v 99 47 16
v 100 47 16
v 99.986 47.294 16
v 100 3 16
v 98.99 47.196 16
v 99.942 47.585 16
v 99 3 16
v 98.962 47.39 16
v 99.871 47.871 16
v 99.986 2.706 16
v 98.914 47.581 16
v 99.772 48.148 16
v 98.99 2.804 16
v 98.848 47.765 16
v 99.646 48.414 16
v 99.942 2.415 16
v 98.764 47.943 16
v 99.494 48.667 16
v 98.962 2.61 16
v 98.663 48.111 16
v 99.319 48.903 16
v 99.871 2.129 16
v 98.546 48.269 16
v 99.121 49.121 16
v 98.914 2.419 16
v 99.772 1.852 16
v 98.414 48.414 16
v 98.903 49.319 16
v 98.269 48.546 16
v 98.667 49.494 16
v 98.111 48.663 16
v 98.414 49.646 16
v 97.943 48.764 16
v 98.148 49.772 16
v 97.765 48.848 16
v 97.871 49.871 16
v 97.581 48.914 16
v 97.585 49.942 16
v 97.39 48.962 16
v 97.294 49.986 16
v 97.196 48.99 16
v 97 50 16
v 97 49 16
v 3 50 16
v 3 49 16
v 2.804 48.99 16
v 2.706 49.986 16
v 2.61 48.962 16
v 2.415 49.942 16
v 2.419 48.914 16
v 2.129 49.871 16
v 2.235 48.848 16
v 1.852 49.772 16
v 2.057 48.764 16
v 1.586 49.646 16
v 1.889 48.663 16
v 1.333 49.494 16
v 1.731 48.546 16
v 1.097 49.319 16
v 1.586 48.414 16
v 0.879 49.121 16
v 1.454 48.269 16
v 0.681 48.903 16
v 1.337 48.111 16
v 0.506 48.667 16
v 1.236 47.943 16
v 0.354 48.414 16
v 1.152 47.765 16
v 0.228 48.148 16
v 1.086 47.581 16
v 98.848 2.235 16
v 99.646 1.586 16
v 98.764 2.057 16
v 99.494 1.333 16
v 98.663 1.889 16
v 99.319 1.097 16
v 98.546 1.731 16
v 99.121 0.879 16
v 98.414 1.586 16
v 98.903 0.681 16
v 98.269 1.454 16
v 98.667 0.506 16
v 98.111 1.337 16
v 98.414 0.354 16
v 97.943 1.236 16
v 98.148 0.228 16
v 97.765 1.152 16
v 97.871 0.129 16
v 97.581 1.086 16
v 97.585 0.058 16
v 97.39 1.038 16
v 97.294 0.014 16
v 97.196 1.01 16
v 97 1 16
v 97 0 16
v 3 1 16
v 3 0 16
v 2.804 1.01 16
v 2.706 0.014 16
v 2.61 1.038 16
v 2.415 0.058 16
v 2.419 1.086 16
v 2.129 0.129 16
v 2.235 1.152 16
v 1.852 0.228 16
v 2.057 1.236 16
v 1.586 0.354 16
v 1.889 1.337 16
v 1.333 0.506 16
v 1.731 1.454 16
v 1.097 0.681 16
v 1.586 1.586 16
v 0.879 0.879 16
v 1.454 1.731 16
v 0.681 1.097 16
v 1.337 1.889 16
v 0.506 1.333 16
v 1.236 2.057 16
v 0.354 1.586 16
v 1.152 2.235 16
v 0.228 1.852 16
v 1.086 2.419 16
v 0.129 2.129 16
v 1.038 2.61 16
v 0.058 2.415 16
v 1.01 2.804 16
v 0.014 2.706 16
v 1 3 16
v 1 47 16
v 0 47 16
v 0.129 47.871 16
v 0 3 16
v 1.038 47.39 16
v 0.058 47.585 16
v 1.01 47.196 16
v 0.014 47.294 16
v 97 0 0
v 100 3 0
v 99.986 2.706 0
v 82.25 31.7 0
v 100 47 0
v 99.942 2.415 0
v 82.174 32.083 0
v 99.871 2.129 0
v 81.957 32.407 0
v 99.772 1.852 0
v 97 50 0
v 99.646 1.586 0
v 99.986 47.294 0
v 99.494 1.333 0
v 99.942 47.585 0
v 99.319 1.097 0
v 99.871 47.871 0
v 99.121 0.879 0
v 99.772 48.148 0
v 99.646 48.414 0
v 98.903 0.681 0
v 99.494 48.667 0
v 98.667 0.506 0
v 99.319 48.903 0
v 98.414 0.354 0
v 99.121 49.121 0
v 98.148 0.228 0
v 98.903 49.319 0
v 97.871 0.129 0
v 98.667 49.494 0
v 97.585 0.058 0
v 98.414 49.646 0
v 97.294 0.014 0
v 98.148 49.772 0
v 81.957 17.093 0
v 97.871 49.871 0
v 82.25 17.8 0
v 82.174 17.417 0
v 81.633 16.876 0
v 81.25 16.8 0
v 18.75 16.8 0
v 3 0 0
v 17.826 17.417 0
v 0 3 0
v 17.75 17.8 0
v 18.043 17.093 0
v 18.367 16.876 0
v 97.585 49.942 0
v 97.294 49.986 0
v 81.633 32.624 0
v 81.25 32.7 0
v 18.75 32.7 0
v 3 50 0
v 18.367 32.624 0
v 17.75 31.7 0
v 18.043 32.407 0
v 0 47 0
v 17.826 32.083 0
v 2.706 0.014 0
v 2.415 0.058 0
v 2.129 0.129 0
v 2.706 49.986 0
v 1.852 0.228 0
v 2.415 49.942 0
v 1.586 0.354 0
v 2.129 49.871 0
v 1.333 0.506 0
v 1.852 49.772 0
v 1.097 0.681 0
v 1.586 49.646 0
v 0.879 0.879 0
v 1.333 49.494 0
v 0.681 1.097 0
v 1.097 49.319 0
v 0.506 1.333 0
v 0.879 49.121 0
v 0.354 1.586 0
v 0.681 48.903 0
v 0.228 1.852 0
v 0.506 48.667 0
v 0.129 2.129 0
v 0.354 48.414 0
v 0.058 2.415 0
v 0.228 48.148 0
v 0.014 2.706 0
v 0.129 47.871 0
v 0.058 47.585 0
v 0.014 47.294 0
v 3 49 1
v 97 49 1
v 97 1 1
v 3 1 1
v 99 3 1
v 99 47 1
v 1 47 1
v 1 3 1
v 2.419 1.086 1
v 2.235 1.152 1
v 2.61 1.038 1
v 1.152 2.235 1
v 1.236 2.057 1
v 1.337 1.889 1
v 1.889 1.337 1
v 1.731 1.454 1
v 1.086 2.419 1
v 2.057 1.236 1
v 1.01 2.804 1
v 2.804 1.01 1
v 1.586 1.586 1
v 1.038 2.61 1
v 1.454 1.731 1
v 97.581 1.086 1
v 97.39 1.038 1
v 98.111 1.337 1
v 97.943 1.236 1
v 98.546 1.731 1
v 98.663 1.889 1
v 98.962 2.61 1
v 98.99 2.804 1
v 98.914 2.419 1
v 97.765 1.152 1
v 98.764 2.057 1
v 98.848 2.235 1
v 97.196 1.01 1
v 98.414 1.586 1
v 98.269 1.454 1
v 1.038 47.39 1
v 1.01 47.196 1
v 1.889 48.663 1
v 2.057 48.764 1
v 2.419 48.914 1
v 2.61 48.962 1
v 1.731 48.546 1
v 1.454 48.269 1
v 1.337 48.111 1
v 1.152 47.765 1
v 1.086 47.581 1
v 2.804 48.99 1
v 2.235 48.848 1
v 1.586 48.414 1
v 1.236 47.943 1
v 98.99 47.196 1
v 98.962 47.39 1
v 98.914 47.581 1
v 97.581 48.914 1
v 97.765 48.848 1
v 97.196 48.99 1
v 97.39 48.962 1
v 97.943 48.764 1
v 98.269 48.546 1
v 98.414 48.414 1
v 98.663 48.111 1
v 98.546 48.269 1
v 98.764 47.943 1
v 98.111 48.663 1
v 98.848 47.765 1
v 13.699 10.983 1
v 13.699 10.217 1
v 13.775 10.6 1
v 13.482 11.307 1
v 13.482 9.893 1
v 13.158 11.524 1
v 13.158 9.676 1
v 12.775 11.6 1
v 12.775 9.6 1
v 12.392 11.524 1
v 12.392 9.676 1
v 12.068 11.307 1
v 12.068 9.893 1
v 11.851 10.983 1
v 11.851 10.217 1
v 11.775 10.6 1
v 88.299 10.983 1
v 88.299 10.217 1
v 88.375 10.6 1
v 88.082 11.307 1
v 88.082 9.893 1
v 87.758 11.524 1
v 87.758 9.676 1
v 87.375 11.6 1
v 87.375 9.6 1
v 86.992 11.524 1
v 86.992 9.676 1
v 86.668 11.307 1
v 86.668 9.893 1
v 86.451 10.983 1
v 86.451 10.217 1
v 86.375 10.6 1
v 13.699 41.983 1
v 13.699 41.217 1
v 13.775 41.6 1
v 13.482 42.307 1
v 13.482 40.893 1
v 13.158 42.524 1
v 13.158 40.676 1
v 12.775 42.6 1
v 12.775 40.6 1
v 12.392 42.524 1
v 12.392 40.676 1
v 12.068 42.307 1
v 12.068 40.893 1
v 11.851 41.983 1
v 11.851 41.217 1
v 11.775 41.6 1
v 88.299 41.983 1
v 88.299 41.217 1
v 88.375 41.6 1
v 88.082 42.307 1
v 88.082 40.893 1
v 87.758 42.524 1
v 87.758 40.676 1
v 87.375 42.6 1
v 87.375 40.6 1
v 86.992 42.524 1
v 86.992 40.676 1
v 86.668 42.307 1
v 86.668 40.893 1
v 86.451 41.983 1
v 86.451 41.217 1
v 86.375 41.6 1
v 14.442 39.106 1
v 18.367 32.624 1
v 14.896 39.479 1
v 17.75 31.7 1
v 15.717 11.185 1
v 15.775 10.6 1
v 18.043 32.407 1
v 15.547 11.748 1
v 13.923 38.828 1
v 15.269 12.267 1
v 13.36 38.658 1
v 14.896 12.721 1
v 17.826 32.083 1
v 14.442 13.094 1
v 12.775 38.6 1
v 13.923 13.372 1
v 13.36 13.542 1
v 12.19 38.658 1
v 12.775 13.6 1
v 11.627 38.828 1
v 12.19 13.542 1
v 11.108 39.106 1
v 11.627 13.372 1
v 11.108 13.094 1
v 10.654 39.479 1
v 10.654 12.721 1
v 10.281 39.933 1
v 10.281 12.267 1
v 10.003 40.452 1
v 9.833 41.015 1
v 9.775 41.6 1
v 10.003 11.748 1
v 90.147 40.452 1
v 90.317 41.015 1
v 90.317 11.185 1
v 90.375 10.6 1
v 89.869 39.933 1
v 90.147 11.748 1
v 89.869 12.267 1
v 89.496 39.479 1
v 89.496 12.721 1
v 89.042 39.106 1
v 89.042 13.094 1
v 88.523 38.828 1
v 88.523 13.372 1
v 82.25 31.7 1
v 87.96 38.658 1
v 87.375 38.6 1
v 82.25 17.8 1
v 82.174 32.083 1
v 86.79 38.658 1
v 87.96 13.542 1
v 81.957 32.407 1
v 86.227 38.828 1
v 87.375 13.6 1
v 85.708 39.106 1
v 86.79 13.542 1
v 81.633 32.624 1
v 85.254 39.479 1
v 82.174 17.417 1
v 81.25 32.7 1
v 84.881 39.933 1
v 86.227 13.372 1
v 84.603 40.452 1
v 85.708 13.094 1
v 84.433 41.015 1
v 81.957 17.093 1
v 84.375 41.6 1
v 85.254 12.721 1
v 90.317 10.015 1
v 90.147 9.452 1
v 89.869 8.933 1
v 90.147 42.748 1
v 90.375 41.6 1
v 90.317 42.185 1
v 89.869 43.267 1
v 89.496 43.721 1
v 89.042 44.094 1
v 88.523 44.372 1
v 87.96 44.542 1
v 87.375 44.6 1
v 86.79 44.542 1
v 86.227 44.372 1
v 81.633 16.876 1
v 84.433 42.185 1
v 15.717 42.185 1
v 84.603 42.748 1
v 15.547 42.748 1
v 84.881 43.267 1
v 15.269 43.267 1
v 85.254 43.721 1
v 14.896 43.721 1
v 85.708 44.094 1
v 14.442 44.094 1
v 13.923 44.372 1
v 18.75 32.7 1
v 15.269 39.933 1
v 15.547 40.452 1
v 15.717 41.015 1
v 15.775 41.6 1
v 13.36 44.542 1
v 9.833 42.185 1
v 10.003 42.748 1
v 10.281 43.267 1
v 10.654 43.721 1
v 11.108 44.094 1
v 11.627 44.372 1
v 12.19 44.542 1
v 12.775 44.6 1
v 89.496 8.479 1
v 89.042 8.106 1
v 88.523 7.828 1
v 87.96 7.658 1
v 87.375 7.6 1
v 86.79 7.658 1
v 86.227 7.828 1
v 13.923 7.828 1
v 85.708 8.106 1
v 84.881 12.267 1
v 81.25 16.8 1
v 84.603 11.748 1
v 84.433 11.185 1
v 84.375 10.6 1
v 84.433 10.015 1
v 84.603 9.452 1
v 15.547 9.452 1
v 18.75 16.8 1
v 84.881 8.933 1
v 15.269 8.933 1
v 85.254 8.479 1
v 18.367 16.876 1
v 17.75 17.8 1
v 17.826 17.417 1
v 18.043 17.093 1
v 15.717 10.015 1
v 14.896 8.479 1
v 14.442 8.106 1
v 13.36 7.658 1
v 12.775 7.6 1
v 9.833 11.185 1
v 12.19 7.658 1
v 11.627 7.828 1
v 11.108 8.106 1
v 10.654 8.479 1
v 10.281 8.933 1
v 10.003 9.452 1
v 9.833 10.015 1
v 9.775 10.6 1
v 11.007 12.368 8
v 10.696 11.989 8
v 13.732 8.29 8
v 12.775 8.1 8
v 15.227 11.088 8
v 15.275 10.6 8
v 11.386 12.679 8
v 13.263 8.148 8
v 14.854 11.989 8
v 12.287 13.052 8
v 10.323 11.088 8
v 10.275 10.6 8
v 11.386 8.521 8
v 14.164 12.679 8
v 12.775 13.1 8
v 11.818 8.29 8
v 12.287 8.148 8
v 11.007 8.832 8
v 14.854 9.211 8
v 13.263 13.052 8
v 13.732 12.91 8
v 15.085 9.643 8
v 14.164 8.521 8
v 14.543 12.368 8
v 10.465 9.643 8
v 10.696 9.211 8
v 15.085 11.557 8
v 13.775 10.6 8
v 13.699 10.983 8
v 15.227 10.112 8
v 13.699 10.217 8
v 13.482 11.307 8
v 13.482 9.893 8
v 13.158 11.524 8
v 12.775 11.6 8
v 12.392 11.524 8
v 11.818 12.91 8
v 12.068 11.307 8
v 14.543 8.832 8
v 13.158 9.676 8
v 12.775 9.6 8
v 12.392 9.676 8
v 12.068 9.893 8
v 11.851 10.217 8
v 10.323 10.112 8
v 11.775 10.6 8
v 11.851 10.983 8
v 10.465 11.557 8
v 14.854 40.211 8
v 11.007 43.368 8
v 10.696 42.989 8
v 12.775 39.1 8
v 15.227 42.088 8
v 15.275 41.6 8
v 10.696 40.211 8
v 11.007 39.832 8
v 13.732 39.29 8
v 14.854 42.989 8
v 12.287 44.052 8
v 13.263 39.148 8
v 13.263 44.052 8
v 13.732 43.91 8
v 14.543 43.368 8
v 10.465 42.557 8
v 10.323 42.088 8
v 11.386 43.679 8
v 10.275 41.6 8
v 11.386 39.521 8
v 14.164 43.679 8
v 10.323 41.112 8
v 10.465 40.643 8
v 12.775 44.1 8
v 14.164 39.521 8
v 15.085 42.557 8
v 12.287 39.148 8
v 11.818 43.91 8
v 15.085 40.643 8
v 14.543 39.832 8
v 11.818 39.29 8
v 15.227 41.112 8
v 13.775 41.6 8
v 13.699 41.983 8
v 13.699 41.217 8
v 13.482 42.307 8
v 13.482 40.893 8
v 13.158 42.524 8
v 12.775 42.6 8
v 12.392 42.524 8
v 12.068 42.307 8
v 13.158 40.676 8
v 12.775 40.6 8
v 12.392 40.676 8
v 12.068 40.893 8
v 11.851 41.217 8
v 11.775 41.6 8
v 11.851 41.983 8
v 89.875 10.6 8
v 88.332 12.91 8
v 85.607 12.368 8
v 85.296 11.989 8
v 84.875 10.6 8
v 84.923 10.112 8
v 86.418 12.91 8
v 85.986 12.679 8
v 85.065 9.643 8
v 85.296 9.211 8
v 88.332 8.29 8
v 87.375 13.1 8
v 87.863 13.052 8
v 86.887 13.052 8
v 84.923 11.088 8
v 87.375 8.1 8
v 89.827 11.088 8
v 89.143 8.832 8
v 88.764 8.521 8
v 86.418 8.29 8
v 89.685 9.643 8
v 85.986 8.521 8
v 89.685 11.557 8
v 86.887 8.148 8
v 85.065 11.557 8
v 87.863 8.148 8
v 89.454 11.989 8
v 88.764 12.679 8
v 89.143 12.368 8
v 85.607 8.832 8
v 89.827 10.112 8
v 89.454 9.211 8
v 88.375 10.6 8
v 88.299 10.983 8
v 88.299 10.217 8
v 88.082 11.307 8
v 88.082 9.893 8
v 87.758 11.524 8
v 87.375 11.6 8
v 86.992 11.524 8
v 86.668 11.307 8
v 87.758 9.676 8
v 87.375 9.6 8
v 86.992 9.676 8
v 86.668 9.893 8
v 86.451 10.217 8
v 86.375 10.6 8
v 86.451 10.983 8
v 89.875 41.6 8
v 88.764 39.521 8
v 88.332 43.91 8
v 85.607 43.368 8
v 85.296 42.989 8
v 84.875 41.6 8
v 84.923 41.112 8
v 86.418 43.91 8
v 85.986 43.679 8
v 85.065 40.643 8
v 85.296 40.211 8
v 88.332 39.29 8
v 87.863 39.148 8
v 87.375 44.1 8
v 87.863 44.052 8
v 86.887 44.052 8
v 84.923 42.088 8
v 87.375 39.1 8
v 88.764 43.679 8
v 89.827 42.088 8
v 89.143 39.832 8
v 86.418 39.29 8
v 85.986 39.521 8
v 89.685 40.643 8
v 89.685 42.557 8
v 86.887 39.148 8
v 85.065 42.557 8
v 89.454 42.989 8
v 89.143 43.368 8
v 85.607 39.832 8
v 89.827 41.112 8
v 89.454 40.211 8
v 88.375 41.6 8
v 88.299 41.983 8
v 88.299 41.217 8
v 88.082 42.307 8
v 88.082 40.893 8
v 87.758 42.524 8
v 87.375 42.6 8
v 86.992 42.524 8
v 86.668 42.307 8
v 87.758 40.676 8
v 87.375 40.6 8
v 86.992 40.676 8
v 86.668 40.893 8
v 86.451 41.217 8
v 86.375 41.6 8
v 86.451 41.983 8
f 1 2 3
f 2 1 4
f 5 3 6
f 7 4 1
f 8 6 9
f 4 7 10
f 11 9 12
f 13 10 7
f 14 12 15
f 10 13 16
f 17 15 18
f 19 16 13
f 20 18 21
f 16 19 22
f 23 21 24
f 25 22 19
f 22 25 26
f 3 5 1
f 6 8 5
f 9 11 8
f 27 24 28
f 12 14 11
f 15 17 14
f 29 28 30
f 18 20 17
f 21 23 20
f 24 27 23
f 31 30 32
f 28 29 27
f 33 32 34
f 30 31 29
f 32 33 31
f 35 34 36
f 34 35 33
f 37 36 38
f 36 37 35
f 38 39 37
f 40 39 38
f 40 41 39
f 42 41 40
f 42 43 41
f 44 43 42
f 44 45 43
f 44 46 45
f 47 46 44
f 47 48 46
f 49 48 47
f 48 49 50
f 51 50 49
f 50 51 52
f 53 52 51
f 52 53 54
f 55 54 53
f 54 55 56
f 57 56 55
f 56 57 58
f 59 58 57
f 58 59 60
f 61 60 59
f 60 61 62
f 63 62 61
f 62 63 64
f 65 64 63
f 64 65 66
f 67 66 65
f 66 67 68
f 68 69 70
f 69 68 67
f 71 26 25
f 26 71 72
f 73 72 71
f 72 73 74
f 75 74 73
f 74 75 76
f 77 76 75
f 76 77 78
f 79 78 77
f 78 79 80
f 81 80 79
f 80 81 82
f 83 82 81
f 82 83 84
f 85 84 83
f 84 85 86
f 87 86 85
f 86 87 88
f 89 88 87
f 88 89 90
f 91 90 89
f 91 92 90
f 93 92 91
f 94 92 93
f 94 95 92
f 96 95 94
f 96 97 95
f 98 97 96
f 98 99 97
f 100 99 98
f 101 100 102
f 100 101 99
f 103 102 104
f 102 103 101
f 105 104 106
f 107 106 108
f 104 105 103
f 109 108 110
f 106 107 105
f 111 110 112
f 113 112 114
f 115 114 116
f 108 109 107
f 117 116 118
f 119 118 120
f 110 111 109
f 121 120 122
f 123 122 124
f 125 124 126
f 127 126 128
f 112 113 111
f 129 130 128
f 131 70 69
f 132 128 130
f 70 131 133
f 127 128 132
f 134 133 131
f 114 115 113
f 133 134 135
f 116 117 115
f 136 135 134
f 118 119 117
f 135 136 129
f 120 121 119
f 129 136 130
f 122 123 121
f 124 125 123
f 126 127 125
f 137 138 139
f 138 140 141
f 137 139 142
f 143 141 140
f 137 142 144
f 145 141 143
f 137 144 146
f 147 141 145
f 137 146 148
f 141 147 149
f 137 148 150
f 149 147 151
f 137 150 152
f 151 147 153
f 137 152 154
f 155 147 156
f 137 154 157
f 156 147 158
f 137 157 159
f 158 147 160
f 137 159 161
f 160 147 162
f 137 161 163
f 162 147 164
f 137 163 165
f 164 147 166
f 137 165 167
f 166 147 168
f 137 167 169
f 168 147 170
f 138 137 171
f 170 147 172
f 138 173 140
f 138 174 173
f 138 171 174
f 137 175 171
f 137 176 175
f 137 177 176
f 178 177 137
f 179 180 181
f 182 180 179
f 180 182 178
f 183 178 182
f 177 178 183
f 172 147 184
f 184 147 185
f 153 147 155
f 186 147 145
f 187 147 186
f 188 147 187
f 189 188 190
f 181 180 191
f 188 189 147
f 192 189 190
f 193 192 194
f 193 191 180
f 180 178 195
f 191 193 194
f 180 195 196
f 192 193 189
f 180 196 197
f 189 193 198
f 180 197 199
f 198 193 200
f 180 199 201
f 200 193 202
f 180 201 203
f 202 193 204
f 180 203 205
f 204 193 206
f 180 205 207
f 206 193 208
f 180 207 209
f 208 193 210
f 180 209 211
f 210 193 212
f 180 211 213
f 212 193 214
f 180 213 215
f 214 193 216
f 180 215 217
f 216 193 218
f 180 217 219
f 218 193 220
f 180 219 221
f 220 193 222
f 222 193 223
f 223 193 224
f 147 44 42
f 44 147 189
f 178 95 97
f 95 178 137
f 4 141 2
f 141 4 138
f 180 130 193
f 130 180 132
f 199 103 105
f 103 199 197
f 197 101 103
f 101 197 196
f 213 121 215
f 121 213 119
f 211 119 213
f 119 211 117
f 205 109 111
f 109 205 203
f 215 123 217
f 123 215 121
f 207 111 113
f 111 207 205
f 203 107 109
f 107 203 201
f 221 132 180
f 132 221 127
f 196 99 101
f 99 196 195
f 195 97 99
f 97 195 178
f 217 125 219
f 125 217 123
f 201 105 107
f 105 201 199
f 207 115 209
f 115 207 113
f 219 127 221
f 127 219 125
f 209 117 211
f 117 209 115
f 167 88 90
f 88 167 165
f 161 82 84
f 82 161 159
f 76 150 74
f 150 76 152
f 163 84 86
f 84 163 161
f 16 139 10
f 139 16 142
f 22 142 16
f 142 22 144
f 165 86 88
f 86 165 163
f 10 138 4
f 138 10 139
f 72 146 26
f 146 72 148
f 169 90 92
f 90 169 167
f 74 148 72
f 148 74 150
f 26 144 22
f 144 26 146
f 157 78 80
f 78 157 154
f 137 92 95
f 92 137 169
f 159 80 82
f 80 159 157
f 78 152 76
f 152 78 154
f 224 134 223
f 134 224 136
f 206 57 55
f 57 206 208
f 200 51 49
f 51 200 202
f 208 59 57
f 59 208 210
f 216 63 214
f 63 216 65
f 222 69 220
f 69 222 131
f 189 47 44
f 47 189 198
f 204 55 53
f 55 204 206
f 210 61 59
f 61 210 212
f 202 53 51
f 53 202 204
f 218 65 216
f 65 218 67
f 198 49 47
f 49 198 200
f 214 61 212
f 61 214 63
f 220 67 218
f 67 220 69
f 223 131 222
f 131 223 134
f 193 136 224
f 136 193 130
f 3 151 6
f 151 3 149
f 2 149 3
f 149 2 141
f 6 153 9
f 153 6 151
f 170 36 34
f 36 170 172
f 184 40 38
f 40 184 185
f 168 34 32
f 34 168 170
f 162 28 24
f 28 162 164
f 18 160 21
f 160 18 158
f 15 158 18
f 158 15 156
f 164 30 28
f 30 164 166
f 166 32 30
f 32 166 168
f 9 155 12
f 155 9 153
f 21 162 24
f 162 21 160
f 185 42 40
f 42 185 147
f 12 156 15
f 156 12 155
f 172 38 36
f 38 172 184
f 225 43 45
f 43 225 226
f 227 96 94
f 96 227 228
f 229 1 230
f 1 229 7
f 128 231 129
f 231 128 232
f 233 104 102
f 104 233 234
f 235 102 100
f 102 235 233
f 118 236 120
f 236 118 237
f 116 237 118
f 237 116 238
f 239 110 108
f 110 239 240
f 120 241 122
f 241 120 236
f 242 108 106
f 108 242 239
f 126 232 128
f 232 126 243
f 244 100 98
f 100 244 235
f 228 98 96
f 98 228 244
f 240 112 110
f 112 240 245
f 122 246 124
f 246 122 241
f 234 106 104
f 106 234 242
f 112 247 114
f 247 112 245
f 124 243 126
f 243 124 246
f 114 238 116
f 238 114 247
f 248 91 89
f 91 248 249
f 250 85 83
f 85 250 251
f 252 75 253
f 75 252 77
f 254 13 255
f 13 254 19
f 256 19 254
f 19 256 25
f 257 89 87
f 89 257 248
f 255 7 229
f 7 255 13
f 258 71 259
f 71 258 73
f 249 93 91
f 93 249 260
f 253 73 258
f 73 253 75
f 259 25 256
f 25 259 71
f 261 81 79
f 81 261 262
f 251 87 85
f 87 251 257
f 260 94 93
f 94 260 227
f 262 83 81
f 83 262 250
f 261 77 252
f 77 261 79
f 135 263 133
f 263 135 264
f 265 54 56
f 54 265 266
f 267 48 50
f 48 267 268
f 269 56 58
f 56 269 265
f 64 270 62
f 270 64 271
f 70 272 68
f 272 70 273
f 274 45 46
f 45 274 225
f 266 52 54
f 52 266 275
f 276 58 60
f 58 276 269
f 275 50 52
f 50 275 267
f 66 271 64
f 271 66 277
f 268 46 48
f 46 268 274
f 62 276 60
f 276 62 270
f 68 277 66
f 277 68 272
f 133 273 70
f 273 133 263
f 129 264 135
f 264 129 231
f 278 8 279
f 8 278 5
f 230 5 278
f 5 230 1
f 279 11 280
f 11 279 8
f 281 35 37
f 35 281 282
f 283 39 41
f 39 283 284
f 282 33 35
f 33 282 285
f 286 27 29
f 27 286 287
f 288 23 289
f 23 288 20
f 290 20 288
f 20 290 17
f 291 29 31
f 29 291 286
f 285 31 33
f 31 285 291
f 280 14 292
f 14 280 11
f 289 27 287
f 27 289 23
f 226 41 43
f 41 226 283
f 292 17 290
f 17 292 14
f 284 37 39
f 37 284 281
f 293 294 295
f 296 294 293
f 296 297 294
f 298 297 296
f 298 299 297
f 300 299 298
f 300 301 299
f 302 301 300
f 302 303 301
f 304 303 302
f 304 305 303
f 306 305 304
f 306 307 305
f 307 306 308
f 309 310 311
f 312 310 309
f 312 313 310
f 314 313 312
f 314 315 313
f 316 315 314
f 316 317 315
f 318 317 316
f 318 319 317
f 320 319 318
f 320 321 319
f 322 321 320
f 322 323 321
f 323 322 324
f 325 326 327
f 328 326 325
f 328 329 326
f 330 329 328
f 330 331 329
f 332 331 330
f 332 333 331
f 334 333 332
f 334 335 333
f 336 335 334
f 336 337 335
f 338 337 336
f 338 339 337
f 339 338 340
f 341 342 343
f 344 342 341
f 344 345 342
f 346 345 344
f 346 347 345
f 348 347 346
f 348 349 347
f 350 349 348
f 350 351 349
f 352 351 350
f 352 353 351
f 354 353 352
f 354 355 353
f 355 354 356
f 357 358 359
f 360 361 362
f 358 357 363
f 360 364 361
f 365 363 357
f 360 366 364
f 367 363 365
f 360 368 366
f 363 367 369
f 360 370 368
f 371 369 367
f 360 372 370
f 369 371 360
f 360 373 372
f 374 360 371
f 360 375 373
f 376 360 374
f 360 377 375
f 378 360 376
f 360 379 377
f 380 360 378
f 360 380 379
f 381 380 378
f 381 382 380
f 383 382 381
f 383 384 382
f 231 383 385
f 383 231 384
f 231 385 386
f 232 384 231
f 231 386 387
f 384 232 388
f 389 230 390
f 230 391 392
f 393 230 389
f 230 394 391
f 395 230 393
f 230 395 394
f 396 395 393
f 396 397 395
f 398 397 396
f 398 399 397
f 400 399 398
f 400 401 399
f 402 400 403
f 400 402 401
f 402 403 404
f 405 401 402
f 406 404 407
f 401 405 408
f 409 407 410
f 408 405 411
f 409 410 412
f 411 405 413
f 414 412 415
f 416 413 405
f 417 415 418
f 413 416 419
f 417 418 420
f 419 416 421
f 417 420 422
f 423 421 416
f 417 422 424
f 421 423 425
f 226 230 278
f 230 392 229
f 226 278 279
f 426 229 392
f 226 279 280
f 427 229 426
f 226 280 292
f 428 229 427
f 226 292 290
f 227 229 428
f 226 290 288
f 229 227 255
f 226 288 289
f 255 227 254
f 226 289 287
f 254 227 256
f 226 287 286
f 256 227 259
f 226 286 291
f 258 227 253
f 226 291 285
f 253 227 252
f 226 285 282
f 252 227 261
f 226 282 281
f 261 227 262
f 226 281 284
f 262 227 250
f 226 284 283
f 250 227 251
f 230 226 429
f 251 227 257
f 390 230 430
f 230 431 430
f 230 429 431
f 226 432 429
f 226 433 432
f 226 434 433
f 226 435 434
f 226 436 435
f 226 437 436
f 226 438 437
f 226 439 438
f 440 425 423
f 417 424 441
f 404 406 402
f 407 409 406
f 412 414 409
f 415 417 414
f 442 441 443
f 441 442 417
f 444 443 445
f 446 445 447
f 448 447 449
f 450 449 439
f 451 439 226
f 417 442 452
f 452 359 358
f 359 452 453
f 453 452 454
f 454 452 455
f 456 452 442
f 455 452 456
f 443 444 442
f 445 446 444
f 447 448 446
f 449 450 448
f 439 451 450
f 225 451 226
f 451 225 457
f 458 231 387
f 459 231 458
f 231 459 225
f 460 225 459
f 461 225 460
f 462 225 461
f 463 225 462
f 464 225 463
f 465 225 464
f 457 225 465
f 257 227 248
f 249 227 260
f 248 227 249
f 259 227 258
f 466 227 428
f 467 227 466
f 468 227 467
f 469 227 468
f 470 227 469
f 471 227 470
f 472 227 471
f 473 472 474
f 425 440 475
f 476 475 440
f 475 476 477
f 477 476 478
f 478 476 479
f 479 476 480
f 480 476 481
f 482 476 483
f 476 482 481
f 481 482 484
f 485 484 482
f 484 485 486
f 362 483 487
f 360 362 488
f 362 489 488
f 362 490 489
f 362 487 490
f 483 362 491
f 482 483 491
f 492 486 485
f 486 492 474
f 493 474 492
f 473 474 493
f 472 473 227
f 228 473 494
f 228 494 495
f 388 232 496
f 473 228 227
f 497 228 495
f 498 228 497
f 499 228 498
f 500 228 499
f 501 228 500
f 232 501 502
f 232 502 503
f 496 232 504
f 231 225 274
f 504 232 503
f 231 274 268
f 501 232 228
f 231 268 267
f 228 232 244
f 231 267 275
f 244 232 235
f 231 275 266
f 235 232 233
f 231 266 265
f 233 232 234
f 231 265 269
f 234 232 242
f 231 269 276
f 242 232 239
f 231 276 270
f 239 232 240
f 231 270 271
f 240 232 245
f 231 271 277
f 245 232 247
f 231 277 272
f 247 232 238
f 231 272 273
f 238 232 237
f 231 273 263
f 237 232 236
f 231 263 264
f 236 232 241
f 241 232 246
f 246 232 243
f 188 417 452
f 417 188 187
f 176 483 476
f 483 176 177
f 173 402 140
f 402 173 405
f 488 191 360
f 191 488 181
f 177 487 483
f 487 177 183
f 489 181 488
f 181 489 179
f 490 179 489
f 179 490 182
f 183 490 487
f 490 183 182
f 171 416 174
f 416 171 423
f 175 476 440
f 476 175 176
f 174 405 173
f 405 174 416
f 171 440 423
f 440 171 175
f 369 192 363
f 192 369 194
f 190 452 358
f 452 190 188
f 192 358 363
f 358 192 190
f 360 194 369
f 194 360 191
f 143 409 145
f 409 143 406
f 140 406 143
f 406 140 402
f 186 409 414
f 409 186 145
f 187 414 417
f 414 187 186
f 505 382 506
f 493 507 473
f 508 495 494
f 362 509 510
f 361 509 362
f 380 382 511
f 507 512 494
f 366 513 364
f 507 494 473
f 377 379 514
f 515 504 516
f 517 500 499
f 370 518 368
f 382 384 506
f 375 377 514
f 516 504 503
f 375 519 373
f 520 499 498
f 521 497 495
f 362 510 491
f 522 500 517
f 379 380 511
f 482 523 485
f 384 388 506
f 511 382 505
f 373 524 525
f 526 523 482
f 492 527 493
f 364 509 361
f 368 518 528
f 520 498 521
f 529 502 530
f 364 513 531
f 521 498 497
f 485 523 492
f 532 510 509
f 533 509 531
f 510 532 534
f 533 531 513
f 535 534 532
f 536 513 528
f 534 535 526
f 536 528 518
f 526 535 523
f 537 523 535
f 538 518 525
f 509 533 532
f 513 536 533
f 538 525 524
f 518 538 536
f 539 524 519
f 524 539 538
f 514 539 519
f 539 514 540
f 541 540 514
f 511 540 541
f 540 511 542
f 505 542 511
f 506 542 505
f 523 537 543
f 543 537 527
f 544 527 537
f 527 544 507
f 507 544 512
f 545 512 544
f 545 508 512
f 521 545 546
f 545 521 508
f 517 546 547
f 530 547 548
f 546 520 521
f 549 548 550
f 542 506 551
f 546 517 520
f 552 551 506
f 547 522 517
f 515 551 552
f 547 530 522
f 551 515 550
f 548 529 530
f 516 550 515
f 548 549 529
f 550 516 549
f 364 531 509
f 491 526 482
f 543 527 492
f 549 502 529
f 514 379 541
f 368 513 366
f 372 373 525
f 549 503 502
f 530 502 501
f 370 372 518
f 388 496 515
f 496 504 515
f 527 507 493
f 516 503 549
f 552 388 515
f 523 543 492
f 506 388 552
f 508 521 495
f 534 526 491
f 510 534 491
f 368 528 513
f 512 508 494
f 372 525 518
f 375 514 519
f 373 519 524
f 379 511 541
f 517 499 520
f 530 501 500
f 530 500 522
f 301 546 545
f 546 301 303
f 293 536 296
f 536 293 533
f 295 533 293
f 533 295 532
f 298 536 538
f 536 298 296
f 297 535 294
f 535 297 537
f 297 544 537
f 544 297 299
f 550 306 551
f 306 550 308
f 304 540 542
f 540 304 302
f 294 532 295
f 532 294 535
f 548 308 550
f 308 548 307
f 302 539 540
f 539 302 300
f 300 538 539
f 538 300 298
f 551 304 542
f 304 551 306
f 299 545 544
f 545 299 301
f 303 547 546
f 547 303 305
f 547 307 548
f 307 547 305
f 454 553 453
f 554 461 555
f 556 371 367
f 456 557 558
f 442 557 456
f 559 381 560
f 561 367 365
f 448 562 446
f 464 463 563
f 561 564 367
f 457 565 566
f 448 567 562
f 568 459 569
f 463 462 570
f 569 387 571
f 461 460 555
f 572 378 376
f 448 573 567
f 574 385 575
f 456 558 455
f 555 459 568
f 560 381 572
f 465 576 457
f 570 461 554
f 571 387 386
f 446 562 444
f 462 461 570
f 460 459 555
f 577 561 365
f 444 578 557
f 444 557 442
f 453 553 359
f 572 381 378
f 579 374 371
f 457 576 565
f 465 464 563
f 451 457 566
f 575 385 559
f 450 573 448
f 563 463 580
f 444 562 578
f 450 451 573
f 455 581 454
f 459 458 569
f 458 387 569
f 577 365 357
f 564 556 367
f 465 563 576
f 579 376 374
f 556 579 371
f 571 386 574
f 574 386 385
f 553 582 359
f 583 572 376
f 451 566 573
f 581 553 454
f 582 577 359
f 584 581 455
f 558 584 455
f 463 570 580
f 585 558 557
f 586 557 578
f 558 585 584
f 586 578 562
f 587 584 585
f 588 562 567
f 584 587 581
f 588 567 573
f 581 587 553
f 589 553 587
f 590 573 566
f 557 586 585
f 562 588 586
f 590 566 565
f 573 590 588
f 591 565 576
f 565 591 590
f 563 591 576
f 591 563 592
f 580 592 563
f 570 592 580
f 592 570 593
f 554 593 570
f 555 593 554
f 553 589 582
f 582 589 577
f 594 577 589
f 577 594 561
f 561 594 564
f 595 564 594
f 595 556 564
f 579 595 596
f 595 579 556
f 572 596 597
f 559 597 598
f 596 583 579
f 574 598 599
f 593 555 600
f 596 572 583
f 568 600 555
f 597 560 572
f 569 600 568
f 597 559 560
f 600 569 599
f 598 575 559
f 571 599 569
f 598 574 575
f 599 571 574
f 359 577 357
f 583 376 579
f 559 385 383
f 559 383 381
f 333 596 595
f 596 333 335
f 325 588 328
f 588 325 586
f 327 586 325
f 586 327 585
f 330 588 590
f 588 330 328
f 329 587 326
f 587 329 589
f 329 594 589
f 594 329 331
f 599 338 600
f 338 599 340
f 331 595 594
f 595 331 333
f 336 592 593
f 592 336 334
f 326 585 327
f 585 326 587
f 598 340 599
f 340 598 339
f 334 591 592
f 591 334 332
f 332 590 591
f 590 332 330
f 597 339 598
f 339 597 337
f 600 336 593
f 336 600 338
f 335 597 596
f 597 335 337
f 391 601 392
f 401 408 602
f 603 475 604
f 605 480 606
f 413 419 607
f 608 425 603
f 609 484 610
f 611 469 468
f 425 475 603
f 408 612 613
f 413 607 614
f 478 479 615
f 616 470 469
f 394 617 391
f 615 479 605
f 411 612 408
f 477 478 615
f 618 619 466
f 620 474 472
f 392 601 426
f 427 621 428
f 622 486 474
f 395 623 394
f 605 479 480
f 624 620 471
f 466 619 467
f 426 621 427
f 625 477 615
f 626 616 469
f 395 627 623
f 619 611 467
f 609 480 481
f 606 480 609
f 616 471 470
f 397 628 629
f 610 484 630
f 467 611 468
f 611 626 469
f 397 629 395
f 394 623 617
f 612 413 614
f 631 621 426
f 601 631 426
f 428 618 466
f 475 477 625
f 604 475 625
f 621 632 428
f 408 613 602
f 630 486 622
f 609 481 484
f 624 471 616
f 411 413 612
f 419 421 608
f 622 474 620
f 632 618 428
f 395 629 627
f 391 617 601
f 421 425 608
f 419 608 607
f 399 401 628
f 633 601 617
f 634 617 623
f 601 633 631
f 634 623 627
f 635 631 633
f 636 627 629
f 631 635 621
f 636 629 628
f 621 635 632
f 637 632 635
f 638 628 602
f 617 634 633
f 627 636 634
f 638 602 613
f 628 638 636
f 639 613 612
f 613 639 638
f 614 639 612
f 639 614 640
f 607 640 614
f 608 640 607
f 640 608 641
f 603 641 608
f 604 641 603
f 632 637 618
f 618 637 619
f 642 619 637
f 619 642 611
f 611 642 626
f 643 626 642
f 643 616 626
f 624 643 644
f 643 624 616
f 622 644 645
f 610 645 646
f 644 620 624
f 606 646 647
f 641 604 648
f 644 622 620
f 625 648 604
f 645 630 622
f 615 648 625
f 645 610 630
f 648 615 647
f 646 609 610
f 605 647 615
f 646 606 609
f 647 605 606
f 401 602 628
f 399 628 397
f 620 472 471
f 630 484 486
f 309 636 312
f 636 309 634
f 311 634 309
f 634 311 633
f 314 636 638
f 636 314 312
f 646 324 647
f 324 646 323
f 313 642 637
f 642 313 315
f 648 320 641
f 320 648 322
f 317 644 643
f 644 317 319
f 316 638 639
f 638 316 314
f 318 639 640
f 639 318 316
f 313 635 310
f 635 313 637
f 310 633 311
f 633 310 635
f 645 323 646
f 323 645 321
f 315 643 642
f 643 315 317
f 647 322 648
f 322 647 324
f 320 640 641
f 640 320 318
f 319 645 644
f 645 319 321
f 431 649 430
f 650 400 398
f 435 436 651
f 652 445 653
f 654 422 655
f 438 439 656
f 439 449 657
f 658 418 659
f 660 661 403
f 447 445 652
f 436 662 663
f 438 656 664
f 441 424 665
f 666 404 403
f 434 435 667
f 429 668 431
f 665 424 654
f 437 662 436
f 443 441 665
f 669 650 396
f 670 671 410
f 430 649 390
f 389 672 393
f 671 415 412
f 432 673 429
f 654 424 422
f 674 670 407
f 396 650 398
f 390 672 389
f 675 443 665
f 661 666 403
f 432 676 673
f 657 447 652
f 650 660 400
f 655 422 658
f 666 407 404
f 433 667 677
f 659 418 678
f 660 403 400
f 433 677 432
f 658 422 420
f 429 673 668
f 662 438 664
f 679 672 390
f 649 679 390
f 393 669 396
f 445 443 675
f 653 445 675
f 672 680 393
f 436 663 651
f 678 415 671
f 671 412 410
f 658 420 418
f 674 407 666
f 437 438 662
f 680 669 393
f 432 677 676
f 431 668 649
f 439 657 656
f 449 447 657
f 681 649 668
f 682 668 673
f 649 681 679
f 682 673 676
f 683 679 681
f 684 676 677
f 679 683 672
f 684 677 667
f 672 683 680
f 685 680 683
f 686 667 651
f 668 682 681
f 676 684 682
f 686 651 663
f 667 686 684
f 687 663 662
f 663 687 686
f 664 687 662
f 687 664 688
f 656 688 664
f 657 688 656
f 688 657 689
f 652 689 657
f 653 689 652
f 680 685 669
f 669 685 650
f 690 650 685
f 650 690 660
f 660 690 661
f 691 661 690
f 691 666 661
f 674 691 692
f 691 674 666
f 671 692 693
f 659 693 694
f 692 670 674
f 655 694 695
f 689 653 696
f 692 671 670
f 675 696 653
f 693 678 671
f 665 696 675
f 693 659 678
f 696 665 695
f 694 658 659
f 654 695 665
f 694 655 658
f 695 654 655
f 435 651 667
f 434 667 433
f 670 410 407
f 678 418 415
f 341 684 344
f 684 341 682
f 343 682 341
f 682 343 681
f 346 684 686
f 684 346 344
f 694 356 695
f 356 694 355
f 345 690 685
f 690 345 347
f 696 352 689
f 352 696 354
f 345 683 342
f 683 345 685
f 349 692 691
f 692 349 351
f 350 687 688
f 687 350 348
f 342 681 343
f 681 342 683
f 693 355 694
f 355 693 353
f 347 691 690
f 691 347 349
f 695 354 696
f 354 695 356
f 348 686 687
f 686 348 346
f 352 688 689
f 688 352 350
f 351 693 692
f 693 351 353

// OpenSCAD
//base plate
size_x=100;
size_y=50;
size_z=1;
corner_radius=3;
corner_faces=64;

//cutout
cutout_corner_radius=1;
cutout_corner_faces=16;
offset_x=10;
offset_y=8;

//rim
rim_height=16;

module plate (sizeX, sizeY, sizeZ, cornerRadius, cornerFaces)
{
    translate([cornerRadius, 0, 0])
        cube([sizeX - 2 * cornerRadius, sizeY, sizeZ]);		
    translate([0, cornerRadius, 0])
        cube([sizeX, sizeY - 2 * cornerRadius, sizeZ]);		
    translate([cornerRadius,cornerRadius,0])
        cylinder(r=cornerRadius,h=sizeZ, $fn=cornerFaces);
    translate([sizeX-cornerRadius,cornerRadius,0])
        cylinder(r=cornerRadius,h=sizeZ, $fn=cornerFaces);
    translate([cornerRadius,sizeY-cornerRadius,0])
        cylinder(r=cornerRadius,h=sizeZ, $fn=cornerFaces);
    translate([sizeX-cornerRadius,sizeY-cornerRadius,0])
        cylinder(r=cornerRadius,h=sizeZ, $fn=cornerFaces);
}

module posts()
{

	union()
	{
		difference()
		{
			translate([0+2.775,0+2.6,size_z]) cylinder(r1=6/2, r2=5/2,h=7, $fn=32);	
			translate([0+2.775,0+2.6,size_z]) cylinder(r=1,h=7.5, $fn=16);
		}
		difference()
		{
			translate([0+2.775,31+2.6,size_z]) cylinder(r1=6/2, r2=5/2,h=7, $fn=32);
			translate([0+2.775,31+2.6,size_z]) cylinder(r=1,h=7.5, $fn=16);
		}

		difference()
		{
			translate([74.60+2.775,0+2.6,size_z]) cylinder(r1=6/2, r2=5/2,h=7, $fn=32);
			translate([74.60+2.775,0+2.6,size_z]) cylinder(r=1,h=7.5, $fn=16);
		}	

		difference()
		{
			translate([74.60+2.775,31+2.6,size_z]) cylinder(r1=6/2, r2=5/2,h=7, $fn=32);
			translate([74.60+2.775,31+2.6,size_z]) cylinder(r=1,h=7.5, $fn=16);
		}
	}
}


difference()
{
    plate (size_x, size_y,rim_height, corner_radius, corner_faces);
    translate([size_z,size_z,-size_z])
        plate (size_x-(2*size_z), size_y-(2*size_z),rim_height + size_z * 2, corner_radius-size_z, corner_faces);
}

union()
{
    difference()
    {
        //base plate
        plate (size_x, size_y, size_z, corner_radius, corner_faces);
        //display cutout
        translate([7.75+offset_x,8.8+offset_y,-size_z * 5])
            plate(64.5,15.9,10,cutout_corner_radius,cutout_corner_faces);

    }
    translate([offset_x,offset_y,0])
        posts();
}


